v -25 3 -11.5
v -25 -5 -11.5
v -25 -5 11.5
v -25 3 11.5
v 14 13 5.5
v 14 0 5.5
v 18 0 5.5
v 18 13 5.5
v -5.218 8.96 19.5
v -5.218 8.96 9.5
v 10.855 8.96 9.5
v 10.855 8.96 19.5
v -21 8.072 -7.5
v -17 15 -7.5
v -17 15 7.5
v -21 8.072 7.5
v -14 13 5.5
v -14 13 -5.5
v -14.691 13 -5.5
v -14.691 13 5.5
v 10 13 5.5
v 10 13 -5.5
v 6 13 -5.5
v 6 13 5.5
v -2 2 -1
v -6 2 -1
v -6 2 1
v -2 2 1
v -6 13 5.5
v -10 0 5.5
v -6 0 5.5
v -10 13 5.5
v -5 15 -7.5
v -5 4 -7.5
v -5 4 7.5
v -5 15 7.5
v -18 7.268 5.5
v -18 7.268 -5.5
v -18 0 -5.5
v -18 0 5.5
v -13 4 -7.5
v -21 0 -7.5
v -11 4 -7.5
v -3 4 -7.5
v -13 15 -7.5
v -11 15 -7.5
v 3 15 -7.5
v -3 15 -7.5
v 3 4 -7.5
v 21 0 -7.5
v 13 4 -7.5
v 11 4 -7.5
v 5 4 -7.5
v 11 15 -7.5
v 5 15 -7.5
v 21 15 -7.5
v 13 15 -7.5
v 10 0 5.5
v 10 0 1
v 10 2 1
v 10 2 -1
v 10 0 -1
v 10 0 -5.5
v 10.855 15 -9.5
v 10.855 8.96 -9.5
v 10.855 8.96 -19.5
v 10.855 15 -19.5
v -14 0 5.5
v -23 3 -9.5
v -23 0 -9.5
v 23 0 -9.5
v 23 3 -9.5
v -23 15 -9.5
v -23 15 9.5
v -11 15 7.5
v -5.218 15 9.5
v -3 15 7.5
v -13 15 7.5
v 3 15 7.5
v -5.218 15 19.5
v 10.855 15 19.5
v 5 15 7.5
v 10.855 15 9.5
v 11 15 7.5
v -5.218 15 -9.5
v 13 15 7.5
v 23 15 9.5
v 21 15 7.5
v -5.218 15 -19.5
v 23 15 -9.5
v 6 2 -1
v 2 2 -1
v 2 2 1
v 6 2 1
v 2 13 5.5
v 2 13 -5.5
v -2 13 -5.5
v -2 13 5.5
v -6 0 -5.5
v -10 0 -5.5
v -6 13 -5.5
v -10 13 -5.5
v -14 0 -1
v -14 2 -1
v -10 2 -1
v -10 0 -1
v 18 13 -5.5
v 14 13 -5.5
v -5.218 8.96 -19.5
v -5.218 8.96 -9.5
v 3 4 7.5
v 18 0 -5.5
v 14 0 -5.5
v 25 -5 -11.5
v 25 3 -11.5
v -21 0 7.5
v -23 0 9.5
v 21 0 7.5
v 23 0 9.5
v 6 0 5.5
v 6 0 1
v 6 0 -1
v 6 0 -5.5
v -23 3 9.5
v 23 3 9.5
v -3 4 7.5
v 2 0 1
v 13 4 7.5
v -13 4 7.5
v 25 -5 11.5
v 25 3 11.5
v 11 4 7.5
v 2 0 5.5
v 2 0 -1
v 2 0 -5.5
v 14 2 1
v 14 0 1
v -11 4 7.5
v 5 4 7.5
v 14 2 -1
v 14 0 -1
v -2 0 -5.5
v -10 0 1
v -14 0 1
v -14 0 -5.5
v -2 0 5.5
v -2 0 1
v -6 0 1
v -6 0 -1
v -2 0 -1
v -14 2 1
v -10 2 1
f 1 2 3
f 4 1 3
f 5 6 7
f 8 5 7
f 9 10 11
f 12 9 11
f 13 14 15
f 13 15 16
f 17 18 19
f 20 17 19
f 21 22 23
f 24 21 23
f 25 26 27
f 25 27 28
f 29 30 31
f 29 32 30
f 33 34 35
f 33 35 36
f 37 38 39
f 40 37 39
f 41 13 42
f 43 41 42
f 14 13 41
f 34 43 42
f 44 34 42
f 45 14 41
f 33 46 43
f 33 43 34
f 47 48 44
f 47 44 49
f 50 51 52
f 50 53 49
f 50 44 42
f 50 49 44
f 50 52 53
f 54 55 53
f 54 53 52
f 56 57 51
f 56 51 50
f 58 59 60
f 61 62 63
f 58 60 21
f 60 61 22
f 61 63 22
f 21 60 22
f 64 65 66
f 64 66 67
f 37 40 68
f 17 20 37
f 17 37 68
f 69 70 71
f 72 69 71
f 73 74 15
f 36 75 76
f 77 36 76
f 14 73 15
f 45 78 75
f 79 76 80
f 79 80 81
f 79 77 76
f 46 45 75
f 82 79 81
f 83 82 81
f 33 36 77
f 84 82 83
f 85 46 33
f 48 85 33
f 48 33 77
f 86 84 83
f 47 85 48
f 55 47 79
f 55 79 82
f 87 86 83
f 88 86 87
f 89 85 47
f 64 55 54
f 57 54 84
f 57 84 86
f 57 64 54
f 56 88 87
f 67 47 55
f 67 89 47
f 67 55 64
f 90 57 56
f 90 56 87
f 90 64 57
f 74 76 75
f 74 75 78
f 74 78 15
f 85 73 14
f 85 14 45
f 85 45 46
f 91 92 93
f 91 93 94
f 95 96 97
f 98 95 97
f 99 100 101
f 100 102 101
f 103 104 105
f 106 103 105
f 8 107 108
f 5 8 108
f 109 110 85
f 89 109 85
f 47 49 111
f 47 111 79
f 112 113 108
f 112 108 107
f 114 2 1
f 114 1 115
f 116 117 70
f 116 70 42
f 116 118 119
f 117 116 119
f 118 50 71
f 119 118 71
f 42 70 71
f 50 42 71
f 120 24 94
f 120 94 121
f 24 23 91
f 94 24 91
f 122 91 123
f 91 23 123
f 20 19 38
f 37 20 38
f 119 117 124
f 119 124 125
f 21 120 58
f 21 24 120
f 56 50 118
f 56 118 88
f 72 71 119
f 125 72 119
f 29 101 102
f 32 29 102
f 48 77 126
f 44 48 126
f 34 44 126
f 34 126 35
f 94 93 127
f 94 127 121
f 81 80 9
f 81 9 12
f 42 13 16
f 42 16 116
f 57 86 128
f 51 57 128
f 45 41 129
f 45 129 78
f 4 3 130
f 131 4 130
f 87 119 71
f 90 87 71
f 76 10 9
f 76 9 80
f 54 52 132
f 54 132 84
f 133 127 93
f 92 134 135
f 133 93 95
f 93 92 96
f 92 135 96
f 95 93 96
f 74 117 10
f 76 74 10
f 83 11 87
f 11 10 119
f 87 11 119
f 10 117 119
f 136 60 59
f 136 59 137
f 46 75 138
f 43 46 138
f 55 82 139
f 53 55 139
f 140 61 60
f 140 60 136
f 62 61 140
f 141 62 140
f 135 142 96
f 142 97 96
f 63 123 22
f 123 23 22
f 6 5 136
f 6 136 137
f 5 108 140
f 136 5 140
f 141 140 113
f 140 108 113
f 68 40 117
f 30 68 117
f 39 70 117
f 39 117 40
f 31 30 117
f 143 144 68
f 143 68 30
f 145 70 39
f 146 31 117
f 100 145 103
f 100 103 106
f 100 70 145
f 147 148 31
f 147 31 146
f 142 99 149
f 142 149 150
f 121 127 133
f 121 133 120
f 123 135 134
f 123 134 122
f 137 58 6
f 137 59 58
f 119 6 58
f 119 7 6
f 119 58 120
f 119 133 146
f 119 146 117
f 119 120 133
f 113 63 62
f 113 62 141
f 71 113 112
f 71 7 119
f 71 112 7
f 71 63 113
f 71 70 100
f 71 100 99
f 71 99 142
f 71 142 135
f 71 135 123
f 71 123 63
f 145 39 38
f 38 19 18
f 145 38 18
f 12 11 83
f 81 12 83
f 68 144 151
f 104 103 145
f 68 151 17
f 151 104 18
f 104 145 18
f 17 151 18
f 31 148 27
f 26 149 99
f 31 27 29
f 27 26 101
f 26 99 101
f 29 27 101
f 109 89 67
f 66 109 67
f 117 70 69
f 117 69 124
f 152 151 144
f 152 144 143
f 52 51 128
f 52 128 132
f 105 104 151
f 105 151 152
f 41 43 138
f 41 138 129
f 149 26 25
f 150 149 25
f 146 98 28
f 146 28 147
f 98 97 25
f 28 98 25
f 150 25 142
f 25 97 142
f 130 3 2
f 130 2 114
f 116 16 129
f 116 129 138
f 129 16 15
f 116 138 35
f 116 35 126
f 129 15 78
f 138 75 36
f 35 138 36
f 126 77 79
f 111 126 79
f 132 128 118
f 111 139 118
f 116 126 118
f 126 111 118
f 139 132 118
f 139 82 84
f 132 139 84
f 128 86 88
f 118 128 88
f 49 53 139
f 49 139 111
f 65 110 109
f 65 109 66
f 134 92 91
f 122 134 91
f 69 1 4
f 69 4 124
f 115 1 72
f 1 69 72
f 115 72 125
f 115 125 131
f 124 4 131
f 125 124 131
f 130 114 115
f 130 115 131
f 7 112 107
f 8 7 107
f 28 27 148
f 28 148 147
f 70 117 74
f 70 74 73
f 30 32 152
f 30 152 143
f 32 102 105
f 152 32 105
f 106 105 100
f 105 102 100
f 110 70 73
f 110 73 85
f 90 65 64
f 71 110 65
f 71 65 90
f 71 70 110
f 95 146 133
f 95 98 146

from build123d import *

# Parameters (mm, degrees)
BOSS_EXTRUDE1_DEPTH      = 7.5
BOSS_EXTRUDE1_DEPTH_BACK = 7.5
CUT_EXTRUDE1_DEPTH       = 5.5
CUT_EXTRUDE1_DEPTH_BACK  = 5.5
SKETCH2_W                = 4
SKETCH2_H                = 13
SKETCH3_W                = 36
SKETCH3_H                = 2
CUT_EXTRUDE2_DEPTH       = 2
BOSS_EXTRUDE2_DEPTH      = 15
BOSS_EXTRUDE2_DEPTH_BACK = 5
SKETCH4_W                = 46
SKETCH4_H                = 19
SPLIT1_START             = -5.5
SPLIT1_DEPTH             = 11
SPLIT1_START_2           = -9.5
SPLIT1_2_OUTLINE_W       = 46
SPLIT1_2_OUTLINE_H       = 5
SPLIT1_2_DEPTH           = 19
SPLIT1_START_3           = -1
SPLIT1_3_OUTLINE_W       = 4
SPLIT1_3_OUTLINE_H       = 2
SPLIT1_3_DEPTH           = 2
SPLIT1_START_4           = -5
SPLIT1_4_OUTLINE_W       = 46
SPLIT1_4_OUTLINE_H       = 19
SPLIT1_4_DEPTH           = 5
SPLIT1_5_OUTLINE_W       = 4
SPLIT1_5_OUTLINE_H       = 11
SPLIT1_5_DEPTH           = 13
SPLIT1_6_OUTLINE_W       = 4
SPLIT1_6_OUTLINE_H       = 2
SPLIT1_6_DEPTH           = 2
SKETCH5_W                = 16.073439162
SKETCH5_H                = 6.039622656
BOSS_EXTRUDE3_DEPTH      = 10
SKETCH6_W                = 50
SKETCH6_H                = 23
SKETCH6_W_2              = 46
SKETCH6_H_2              = 19
BOSS_EXTRUDE4_DEPTH      = 8


# Read off the part's stored shape, not the designer's step: Split1
with BuildPart() as part:
    # Sketch1 → Boss-Extrude1 (new, two sides: drawn at the far end of the back side and taken through both)
    with BuildSketch(Plane.XY.offset(-BOSS_EXTRUDE1_DEPTH_BACK)):
        Polygon((-21, 0), (21, 0), (21, 15), (13, 15), (13, 4), (11, 4), (11, 15), (5, 15), (5, 4), (3, 4), (3, 15), (-3, 15), (-3, 4), (-5, 4), (-5, 15), (-11, 15), (-11, 4), (-13, 4), (-13, 15), (-17, 15), (-21, 8.07179677), align=None)
    extrude(amount=BOSS_EXTRUDE1_DEPTH + BOSS_EXTRUDE1_DEPTH_BACK)

    # Sketch2 → Cut-Extrude1 (cut, two sides: drawn at the far end of the back side and taken through both)
    with BuildSketch(Plane.XY.offset(-CUT_EXTRUDE1_DEPTH_BACK)):
        Polygon((-14, 13), (-14, 0), (-18, 0), (-18, 7.267949192), (-14.690598923, 13), align=None)
        with Locations((-8, 6.5)):
            Rectangle(SKETCH2_W, SKETCH2_H)
        with Locations((0, 6.5)):
            Rectangle(SKETCH2_W, SKETCH2_H)
        with Locations((8, 6.5)):
            Rectangle(SKETCH2_W, SKETCH2_H)
        with Locations((16, 6.5)):
            Rectangle(SKETCH2_W, SKETCH2_H)
    extrude(amount=CUT_EXTRUDE1_DEPTH + CUT_EXTRUDE1_DEPTH_BACK, mode=Mode.SUBTRACT)

    # Sketch3 → Cut-Extrude2 (cut)
    with BuildSketch(Plane(origin=(0, 0, 0), x_dir=(-1, 0, 0), z_dir=(0, -1, 0))):
        Rectangle(SKETCH3_W, SKETCH3_H)
    extrude(amount=-CUT_EXTRUDE2_DEPTH, mode=Mode.SUBTRACT)


with BuildPart() as body_2:
    # Sketch4 → Boss-Extrude2 (new, two sides: drawn at the far end of the back side and taken through both)
    with BuildSketch(Plane(origin=(0, 0, 0), x_dir=(1, 0, 0), z_dir=(0, 1, 0)).offset(-BOSS_EXTRUDE2_DEPTH_BACK)):
        Rectangle(SKETCH4_W, SKETCH4_H)
    extrude(amount=BOSS_EXTRUDE2_DEPTH + BOSS_EXTRUDE2_DEPTH_BACK)

    # Combine1: cut part
    add(part.part, mode=Mode.SUBTRACT)

    # Split1 4 outline → Split1 4 (cut)
    with BuildSketch(Plane(origin=(0, 0, 0), x_dir=(1, 0, 0), z_dir=(0, 1, 0)).offset(SPLIT1_START_4)):
        Rectangle(SPLIT1_4_OUTLINE_W, SPLIT1_4_OUTLINE_H)
    extrude(amount=SPLIT1_4_DEPTH, mode=Mode.SUBTRACT)

    # Split1 5 outline → Split1 5 (cut)
    with BuildSketch(Plane(origin=(0, 0, 0), x_dir=(1, 0, 0), z_dir=(0, 1, 0))):
        with Locations((-8, 0)):
            Rectangle(SPLIT1_5_OUTLINE_W, SPLIT1_5_OUTLINE_H)
        Rectangle(SPLIT1_5_OUTLINE_W, SPLIT1_5_OUTLINE_H)
        with Locations((-16, 0)):
            Rectangle(SPLIT1_5_OUTLINE_W, SPLIT1_5_OUTLINE_H)
        with Locations((8, 0)):
            Rectangle(SPLIT1_5_OUTLINE_W, SPLIT1_5_OUTLINE_H)
        with Locations((16, 0)):
            Rectangle(SPLIT1_5_OUTLINE_W, SPLIT1_5_OUTLINE_H)
    extrude(amount=SPLIT1_5_DEPTH, mode=Mode.SUBTRACT)

    # Split1 6 outline → Split1 6 (cut)
    with BuildSketch(Plane(origin=(0, 0, 0), x_dir=(1, 0, 0), z_dir=(0, 1, 0))):
        with Locations((-4, 0)):
            Rectangle(SPLIT1_6_OUTLINE_W, SPLIT1_6_OUTLINE_H)
        with Locations((-12, 0)):
            Rectangle(SPLIT1_6_OUTLINE_W, SPLIT1_6_OUTLINE_H)
        with Locations((4, 0)):
            Rectangle(SPLIT1_6_OUTLINE_W, SPLIT1_6_OUTLINE_H)
        with Locations((12, 0)):
            Rectangle(SPLIT1_6_OUTLINE_W, SPLIT1_6_OUTLINE_H)
    extrude(amount=SPLIT1_6_DEPTH, mode=Mode.SUBTRACT)

    # Sketch5 → Boss-Extrude3 (add)
    with BuildSketch(Plane.XY.offset(9.5)):
        with Locations((2.818305229, 11.980188672)):
            Rectangle(SKETCH5_W, SKETCH5_H)
    boss_extrude3 = extrude(amount=BOSS_EXTRUDE3_DEPTH)

    # Mirror1: Boss-Extrude3 across plane
    add(boss_extrude3.mirror(Plane.XY))


with BuildPart() as body_2_2:
    # Split1 outline → Split1 (new body)
    with BuildSketch(Plane.XY.offset(SPLIT1_START)):
        Polygon((18, 0), (18, 13), (14, 13), (14, 0), (10, 0), (10, 13), (6, 13), (6, 0), (2, 0), (2, 13), (-2, 13), (-2, 0), (-6, 0), (-6, 13), (-10, 13), (-10, 0), (-14, 0), (-14, 13), (-14.690598923, 13), (-18, 7.267949192), (-18, 0), (-23, 0), (-23, -5), (23, -5), (23, 0), align=None)
    extrude(amount=SPLIT1_DEPTH)

    # Split1 2 outline → Split1 2 (add)
    with BuildSketch(Plane.XY.offset(SPLIT1_START_2)):
        with Locations((0, -2.5)):
            Rectangle(SPLIT1_2_OUTLINE_W, SPLIT1_2_OUTLINE_H)
    extrude(amount=SPLIT1_2_DEPTH)

    # Split1 3 outline → Split1 3 (add)
    with BuildSketch(Plane.XY.offset(SPLIT1_START_3)):
        with Locations((12, 1)):
            Rectangle(SPLIT1_3_OUTLINE_W, SPLIT1_3_OUTLINE_H)
        with Locations((4, 1)):
            Rectangle(SPLIT1_3_OUTLINE_W, SPLIT1_3_OUTLINE_H)
        with Locations((-4, 1)):
            Rectangle(SPLIT1_3_OUTLINE_W, SPLIT1_3_OUTLINE_H)
        with Locations((-12, 1)):
            Rectangle(SPLIT1_3_OUTLINE_W, SPLIT1_3_OUTLINE_H)
    extrude(amount=SPLIT1_3_DEPTH)

    # Sketch6 → Boss-Extrude4 (add)
    with BuildSketch(Plane.XZ.offset(5)):
        Rectangle(SKETCH6_W, SKETCH6_H)
        Rectangle(SKETCH6_W_2, SKETCH6_H_2, mode=Mode.SUBTRACT)
    extrude(amount=-BOSS_EXTRUDE4_DEPTH)


solid = Compound([body_2.part, body_2_2.part])
